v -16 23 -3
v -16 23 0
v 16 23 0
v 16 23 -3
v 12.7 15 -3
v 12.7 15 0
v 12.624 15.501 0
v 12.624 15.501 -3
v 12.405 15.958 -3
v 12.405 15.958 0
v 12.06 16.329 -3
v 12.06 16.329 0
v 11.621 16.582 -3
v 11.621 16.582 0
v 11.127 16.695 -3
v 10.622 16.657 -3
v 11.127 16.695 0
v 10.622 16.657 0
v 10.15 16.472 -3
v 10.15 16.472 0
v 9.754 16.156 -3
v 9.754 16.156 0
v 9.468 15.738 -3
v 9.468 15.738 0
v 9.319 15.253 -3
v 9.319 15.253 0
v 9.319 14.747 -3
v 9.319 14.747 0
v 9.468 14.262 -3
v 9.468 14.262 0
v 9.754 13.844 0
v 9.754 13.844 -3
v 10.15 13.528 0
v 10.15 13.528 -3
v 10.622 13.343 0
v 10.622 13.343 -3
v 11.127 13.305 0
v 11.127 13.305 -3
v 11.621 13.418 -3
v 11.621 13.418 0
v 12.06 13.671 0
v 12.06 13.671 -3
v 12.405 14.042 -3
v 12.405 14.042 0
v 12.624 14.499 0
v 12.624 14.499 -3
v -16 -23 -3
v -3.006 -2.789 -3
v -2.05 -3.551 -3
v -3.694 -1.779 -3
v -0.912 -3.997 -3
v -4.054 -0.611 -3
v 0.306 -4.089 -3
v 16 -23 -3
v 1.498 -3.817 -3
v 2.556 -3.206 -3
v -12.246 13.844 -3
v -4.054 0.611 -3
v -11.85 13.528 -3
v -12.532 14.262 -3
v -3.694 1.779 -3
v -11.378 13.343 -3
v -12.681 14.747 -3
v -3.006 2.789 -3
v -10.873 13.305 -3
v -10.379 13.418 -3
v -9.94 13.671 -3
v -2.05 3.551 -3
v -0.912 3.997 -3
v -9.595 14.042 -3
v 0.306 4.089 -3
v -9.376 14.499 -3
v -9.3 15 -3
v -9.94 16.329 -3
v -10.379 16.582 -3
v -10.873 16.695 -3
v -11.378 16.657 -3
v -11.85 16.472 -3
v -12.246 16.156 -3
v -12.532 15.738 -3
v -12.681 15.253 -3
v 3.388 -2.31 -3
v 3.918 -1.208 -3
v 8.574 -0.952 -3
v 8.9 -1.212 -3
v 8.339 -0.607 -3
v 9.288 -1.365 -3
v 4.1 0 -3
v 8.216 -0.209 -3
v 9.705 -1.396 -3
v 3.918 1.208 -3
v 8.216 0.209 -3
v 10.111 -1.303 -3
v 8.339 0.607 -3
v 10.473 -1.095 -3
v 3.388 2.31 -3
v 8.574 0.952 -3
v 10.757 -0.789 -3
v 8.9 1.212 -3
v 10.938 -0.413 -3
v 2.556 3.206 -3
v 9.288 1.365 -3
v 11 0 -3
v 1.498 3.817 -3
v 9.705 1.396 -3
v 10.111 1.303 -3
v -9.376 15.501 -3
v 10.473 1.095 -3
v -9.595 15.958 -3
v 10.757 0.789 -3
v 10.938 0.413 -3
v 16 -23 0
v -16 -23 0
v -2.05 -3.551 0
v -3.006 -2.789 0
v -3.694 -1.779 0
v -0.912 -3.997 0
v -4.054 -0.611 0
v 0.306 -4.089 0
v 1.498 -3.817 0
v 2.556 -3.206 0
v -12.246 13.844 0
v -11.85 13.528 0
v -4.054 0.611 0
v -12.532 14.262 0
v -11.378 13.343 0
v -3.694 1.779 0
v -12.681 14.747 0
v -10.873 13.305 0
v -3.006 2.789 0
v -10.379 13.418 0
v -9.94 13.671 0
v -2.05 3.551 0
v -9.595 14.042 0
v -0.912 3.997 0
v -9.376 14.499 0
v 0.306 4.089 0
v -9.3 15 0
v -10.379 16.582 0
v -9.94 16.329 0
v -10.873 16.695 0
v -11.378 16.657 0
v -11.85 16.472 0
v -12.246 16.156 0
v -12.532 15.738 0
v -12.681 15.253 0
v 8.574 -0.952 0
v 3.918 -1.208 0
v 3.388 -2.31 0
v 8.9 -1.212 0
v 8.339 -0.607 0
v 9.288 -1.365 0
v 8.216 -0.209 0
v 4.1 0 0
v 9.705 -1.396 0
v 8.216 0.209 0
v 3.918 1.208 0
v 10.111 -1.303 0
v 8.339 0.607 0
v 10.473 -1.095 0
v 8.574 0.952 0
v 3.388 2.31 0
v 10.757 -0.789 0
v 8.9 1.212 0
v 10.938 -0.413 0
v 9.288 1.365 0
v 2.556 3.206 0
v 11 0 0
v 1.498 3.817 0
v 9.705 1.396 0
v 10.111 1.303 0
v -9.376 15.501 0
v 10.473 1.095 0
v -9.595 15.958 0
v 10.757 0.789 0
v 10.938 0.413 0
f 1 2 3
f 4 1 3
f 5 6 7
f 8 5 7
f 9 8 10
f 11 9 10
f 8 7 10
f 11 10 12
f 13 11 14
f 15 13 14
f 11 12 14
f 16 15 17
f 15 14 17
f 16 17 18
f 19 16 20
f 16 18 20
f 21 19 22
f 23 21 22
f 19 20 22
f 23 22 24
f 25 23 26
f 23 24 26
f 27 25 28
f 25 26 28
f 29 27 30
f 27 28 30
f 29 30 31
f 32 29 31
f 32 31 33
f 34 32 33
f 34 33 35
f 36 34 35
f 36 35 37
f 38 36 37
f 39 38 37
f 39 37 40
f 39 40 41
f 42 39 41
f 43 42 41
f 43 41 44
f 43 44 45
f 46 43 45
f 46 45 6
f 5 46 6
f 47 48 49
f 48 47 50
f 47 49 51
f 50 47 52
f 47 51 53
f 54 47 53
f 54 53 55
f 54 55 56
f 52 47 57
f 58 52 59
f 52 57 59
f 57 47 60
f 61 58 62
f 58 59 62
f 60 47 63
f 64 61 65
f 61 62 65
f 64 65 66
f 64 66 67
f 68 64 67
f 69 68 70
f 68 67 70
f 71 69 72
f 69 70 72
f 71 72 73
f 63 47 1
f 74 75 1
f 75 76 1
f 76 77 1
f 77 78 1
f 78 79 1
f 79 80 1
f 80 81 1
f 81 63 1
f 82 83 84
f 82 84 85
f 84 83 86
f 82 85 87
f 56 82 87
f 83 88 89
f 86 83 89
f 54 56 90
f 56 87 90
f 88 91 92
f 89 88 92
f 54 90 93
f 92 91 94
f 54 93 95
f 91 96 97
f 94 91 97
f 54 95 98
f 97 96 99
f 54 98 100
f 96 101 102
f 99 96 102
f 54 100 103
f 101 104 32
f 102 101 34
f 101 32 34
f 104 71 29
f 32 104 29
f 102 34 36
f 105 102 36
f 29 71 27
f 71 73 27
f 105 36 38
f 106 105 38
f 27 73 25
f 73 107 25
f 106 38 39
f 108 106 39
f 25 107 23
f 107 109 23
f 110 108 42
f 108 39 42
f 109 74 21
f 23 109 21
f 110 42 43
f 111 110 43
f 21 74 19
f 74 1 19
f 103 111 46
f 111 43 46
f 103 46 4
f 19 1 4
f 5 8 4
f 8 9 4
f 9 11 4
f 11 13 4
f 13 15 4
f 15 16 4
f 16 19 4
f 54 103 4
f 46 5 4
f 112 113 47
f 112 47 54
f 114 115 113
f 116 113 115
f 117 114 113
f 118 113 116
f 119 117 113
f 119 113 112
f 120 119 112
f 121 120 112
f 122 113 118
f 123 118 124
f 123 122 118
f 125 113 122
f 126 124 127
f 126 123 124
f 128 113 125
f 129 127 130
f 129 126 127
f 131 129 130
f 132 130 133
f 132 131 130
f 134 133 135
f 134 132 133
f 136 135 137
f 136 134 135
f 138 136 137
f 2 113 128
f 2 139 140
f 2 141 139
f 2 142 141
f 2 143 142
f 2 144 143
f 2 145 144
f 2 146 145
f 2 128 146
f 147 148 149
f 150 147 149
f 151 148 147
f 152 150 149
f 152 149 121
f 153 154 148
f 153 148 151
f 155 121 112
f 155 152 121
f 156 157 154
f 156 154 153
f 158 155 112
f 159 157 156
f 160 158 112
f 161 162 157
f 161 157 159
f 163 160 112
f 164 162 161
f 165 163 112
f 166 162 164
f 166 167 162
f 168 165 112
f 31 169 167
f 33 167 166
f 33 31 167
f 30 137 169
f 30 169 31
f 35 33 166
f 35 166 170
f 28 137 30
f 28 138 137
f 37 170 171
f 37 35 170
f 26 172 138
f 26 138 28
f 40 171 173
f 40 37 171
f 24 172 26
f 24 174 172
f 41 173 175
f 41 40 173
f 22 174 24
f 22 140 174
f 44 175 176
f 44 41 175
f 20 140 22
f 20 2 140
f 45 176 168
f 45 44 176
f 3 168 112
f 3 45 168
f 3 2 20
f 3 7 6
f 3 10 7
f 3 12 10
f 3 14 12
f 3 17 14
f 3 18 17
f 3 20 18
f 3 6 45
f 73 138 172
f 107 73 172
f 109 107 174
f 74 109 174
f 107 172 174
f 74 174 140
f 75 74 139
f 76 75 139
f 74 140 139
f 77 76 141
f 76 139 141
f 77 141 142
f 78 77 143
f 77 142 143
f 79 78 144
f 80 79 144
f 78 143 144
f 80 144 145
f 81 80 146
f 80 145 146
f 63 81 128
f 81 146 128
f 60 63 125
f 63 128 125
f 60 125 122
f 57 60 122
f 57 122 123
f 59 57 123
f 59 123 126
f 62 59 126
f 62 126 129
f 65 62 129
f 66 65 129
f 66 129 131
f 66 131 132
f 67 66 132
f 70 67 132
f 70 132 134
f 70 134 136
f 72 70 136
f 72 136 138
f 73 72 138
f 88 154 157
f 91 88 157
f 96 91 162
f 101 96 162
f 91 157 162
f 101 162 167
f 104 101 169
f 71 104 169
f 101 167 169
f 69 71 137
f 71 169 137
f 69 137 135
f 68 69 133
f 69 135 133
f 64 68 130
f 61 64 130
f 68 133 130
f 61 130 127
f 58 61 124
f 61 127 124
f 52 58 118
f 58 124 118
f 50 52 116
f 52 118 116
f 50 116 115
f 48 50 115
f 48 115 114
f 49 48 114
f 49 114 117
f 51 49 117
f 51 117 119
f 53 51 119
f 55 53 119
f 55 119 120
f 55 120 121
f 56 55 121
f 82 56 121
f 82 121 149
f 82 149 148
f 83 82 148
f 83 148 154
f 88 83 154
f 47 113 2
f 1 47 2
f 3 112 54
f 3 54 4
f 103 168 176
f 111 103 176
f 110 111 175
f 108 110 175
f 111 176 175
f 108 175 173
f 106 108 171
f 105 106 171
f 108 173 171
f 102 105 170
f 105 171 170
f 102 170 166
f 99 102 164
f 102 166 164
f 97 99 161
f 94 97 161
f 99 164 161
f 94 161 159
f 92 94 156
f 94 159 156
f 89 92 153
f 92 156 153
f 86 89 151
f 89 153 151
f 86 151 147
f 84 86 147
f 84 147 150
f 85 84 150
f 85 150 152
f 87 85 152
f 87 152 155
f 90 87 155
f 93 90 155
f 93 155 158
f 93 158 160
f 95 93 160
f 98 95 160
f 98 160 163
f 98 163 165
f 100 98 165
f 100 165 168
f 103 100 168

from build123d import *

# Parameters (mm, degrees)
SKETCH_1_W          = 32
SKETCH_1_H          = 46
EXTRUDE_1_DEPTH     = 3
SKETCH_2_R          = 4.1
SKETCH_2_R_2        = 1.4
CUT_EXTRUDE_1_DEPTH = 4
SKETCH_3_R          = 1.7
CUT_EXTRUDE_2_DEPTH = 4


with BuildPart() as part:
    # 草图1 → 凸台-拉伸1 (new body)
    with BuildSketch(Plane.XY):
        Rectangle(SKETCH_1_W, SKETCH_1_H)
    extrude(amount=-EXTRUDE_1_DEPTH)

    # 草图2 → 切除-拉伸1 (cut)
    with BuildSketch(Plane.XY):
        Circle(SKETCH_2_R)
        with Locations((9.6, 0)):
            Circle(SKETCH_2_R_2)
    extrude(amount=-CUT_EXTRUDE_1_DEPTH, mode=Mode.SUBTRACT)

    # 草图3 → 切除-拉伸2 (cut)
    with BuildSketch(Plane.XY):
        with Locations((-11, 15)):
            Circle(SKETCH_3_R)
        with Locations((11, 15)):
            Circle(SKETCH_3_R)
    extrude(amount=-CUT_EXTRUDE_2_DEPTH, mode=Mode.SUBTRACT)


solid = part.part
